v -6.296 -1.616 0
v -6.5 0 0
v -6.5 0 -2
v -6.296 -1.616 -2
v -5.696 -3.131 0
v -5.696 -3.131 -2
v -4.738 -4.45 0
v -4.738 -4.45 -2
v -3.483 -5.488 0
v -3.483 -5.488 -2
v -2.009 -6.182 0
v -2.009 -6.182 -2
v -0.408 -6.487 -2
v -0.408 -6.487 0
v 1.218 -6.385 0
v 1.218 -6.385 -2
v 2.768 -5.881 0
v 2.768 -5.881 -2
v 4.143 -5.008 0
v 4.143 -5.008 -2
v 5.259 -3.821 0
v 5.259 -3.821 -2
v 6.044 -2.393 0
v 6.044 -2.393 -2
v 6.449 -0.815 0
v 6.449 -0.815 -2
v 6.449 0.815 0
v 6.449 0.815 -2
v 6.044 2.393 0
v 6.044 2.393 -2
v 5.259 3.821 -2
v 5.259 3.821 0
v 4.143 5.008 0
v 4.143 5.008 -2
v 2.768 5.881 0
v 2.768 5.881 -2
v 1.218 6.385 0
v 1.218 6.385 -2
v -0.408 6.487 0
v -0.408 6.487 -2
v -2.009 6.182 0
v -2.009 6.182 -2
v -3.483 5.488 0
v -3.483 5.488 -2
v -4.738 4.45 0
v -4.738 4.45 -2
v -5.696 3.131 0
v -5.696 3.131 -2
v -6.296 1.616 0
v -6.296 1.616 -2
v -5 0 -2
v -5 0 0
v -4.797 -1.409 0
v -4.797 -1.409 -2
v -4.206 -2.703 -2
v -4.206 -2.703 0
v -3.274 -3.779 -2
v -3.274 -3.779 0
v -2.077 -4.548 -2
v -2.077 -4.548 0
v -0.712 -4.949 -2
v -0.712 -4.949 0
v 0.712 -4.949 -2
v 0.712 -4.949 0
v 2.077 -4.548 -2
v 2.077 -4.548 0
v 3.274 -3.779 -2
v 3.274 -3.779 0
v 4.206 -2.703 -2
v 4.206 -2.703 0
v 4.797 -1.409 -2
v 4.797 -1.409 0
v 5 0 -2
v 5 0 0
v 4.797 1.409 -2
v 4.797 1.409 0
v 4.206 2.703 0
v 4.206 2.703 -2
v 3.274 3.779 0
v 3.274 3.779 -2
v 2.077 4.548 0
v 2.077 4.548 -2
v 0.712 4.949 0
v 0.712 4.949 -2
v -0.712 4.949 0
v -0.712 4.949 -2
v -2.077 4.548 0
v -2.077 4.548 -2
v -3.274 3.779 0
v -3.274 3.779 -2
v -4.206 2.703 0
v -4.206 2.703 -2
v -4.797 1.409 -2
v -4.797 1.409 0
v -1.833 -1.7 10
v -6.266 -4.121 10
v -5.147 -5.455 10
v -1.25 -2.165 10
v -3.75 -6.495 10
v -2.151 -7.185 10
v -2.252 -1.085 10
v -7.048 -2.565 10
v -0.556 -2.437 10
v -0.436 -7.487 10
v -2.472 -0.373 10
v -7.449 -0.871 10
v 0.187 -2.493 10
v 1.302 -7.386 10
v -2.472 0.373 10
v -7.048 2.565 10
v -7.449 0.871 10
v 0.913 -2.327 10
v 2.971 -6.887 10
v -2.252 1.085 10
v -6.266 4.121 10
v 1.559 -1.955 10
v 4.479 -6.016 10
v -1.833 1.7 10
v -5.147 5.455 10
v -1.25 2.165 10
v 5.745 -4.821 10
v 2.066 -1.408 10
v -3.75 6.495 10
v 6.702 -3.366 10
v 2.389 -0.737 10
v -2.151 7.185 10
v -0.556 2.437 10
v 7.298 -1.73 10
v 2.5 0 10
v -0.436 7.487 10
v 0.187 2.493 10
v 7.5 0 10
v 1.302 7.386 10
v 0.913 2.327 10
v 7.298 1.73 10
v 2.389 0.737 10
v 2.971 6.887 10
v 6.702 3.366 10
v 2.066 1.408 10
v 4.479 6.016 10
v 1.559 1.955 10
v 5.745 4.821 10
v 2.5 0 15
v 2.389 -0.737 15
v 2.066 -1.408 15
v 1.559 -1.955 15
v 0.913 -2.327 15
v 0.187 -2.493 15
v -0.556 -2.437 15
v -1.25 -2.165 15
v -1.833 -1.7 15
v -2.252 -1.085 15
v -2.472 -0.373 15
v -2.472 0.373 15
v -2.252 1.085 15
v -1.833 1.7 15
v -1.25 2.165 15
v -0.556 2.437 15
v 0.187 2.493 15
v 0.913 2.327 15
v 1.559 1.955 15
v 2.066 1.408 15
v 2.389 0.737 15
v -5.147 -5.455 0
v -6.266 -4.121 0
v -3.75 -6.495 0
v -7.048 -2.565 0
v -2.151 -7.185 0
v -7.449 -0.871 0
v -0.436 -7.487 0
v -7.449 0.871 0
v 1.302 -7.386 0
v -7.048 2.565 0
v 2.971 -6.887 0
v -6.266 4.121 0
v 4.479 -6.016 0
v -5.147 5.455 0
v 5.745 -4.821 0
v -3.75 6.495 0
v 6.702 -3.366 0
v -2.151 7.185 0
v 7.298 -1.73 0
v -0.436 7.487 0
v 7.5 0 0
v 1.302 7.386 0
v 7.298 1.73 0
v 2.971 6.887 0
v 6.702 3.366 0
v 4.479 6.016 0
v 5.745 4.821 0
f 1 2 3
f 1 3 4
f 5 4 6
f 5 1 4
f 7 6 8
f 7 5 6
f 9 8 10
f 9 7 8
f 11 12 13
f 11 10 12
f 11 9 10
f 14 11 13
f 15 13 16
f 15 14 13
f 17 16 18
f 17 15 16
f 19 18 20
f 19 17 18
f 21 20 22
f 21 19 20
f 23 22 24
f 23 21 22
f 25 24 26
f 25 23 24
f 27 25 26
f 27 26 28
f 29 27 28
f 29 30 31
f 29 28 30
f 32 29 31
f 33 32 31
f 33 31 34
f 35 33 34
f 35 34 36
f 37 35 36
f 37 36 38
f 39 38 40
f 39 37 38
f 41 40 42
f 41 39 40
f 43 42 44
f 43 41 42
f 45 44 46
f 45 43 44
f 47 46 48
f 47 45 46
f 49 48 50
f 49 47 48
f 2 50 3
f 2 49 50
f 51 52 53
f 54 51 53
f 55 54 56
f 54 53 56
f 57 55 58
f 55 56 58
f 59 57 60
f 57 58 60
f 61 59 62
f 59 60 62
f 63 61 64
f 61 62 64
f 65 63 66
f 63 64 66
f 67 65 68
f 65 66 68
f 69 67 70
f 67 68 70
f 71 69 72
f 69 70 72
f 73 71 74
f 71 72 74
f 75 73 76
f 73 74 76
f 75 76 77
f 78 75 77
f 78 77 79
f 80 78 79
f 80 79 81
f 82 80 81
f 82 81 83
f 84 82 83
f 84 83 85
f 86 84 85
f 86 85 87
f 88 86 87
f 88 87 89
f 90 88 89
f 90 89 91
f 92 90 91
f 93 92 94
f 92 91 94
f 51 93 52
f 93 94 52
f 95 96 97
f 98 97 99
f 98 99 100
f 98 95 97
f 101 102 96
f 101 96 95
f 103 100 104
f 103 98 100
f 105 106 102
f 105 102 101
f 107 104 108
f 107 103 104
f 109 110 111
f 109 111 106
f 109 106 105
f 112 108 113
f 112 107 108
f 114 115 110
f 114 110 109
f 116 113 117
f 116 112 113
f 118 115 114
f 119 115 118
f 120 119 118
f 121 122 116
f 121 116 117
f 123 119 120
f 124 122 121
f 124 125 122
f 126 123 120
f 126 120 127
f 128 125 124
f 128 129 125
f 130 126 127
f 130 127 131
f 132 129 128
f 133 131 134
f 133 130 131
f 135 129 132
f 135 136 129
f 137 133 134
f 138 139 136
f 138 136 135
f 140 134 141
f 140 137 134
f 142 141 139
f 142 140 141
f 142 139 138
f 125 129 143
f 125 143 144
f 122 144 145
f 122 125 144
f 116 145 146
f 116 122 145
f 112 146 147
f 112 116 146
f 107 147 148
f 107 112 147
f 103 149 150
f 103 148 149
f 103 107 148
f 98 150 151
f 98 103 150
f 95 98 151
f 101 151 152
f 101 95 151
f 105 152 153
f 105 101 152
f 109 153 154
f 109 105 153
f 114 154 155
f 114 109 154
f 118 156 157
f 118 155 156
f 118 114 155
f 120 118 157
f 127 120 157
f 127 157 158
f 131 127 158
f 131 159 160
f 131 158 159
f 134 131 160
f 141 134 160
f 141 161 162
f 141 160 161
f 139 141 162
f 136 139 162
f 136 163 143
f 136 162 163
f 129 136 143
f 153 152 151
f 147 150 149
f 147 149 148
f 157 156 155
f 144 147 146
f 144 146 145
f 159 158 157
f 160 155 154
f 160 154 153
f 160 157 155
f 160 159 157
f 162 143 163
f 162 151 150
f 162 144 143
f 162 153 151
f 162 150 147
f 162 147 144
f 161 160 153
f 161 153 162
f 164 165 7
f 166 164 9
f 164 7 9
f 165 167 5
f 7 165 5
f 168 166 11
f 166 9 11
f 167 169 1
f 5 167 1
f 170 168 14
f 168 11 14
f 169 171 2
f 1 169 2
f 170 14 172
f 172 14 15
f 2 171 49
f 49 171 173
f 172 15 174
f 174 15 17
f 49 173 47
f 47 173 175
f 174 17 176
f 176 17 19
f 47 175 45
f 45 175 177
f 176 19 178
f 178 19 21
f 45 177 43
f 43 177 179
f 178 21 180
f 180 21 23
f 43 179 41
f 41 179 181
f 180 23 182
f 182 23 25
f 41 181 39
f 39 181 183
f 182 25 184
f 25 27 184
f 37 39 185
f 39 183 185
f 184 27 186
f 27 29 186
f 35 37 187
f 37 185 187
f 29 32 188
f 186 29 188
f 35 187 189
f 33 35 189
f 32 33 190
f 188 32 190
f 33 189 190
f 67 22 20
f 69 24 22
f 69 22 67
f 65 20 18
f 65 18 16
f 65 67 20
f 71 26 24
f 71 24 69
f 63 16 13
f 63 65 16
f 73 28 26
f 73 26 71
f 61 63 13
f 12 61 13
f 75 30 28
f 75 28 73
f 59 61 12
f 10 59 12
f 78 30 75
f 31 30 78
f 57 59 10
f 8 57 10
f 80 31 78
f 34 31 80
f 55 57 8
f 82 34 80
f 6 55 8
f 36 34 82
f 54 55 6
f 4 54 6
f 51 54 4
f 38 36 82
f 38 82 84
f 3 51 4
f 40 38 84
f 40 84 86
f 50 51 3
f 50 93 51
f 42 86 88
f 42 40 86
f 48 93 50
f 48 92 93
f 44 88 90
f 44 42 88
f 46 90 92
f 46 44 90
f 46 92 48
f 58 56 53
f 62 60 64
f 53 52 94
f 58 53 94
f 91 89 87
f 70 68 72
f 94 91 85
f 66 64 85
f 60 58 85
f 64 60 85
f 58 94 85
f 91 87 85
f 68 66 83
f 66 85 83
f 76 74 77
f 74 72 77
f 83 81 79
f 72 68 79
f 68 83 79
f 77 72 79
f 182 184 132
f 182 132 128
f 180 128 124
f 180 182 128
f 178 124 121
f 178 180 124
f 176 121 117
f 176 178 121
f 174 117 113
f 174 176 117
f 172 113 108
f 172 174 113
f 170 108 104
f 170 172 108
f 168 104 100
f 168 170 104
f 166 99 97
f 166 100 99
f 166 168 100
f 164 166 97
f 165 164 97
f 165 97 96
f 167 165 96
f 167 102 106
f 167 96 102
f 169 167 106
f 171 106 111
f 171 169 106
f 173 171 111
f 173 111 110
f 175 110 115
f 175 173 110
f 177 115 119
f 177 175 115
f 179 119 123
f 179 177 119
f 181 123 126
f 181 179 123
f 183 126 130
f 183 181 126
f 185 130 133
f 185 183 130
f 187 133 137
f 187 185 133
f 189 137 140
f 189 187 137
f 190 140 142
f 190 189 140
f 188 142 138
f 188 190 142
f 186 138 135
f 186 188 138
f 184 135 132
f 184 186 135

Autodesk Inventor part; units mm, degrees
ref_plane "YZ Plane" through (0, 0, 0) normal (1, 0, 0) x (0, 1, 0)
ref_plane "XZ Plane" through (0, 0, 0) normal (0, 1, 0) x (-1, 0, 0)
ref_plane "XY Plane" through (0, 0, 0) normal (0, 0, 1) x (1, 0, 0)
sketch "Sketch1" plane through (0, 0, 0) normal (0, 0, 1) x (1, 0, 0)
  circle A0 centre (0, 0) radius 7.5
  dimension "d0" = 15
extrude "Extrusion1" add sketch "Sketch1" along normal blind 10
sketch "Sketch2" plane through (0, 0, 0) normal (0, 0, -1) x (-1, 0, 0)
  circle A0 centre (0, 0) radius 6.5
  circle A1 centre (0, 0) radius 5
  circle A2 centre (0, 0) radius 7.5 projected
  dimension "d3" = 13
  dimension "d4" = 15
  dimension "d5" = 10
extrude "Extrusion2" add sketch "Sketch2" along normal blind 2 contours A0
sketch "Sketch3" plane through (0, 0, 10) normal (0, 0, 1) x (1, 0, 0)
  circle A0 centre (0, 0) radius 7.5 projected
  circle A1 centre (0, 0) radius 2.5
  dimension "d8" = 15
  dimension "d13" = 5
extrude "Extrusion3" add sketch "Sketch3" along normal blind 5 contours A1
properties part number "stredne_koleso"
